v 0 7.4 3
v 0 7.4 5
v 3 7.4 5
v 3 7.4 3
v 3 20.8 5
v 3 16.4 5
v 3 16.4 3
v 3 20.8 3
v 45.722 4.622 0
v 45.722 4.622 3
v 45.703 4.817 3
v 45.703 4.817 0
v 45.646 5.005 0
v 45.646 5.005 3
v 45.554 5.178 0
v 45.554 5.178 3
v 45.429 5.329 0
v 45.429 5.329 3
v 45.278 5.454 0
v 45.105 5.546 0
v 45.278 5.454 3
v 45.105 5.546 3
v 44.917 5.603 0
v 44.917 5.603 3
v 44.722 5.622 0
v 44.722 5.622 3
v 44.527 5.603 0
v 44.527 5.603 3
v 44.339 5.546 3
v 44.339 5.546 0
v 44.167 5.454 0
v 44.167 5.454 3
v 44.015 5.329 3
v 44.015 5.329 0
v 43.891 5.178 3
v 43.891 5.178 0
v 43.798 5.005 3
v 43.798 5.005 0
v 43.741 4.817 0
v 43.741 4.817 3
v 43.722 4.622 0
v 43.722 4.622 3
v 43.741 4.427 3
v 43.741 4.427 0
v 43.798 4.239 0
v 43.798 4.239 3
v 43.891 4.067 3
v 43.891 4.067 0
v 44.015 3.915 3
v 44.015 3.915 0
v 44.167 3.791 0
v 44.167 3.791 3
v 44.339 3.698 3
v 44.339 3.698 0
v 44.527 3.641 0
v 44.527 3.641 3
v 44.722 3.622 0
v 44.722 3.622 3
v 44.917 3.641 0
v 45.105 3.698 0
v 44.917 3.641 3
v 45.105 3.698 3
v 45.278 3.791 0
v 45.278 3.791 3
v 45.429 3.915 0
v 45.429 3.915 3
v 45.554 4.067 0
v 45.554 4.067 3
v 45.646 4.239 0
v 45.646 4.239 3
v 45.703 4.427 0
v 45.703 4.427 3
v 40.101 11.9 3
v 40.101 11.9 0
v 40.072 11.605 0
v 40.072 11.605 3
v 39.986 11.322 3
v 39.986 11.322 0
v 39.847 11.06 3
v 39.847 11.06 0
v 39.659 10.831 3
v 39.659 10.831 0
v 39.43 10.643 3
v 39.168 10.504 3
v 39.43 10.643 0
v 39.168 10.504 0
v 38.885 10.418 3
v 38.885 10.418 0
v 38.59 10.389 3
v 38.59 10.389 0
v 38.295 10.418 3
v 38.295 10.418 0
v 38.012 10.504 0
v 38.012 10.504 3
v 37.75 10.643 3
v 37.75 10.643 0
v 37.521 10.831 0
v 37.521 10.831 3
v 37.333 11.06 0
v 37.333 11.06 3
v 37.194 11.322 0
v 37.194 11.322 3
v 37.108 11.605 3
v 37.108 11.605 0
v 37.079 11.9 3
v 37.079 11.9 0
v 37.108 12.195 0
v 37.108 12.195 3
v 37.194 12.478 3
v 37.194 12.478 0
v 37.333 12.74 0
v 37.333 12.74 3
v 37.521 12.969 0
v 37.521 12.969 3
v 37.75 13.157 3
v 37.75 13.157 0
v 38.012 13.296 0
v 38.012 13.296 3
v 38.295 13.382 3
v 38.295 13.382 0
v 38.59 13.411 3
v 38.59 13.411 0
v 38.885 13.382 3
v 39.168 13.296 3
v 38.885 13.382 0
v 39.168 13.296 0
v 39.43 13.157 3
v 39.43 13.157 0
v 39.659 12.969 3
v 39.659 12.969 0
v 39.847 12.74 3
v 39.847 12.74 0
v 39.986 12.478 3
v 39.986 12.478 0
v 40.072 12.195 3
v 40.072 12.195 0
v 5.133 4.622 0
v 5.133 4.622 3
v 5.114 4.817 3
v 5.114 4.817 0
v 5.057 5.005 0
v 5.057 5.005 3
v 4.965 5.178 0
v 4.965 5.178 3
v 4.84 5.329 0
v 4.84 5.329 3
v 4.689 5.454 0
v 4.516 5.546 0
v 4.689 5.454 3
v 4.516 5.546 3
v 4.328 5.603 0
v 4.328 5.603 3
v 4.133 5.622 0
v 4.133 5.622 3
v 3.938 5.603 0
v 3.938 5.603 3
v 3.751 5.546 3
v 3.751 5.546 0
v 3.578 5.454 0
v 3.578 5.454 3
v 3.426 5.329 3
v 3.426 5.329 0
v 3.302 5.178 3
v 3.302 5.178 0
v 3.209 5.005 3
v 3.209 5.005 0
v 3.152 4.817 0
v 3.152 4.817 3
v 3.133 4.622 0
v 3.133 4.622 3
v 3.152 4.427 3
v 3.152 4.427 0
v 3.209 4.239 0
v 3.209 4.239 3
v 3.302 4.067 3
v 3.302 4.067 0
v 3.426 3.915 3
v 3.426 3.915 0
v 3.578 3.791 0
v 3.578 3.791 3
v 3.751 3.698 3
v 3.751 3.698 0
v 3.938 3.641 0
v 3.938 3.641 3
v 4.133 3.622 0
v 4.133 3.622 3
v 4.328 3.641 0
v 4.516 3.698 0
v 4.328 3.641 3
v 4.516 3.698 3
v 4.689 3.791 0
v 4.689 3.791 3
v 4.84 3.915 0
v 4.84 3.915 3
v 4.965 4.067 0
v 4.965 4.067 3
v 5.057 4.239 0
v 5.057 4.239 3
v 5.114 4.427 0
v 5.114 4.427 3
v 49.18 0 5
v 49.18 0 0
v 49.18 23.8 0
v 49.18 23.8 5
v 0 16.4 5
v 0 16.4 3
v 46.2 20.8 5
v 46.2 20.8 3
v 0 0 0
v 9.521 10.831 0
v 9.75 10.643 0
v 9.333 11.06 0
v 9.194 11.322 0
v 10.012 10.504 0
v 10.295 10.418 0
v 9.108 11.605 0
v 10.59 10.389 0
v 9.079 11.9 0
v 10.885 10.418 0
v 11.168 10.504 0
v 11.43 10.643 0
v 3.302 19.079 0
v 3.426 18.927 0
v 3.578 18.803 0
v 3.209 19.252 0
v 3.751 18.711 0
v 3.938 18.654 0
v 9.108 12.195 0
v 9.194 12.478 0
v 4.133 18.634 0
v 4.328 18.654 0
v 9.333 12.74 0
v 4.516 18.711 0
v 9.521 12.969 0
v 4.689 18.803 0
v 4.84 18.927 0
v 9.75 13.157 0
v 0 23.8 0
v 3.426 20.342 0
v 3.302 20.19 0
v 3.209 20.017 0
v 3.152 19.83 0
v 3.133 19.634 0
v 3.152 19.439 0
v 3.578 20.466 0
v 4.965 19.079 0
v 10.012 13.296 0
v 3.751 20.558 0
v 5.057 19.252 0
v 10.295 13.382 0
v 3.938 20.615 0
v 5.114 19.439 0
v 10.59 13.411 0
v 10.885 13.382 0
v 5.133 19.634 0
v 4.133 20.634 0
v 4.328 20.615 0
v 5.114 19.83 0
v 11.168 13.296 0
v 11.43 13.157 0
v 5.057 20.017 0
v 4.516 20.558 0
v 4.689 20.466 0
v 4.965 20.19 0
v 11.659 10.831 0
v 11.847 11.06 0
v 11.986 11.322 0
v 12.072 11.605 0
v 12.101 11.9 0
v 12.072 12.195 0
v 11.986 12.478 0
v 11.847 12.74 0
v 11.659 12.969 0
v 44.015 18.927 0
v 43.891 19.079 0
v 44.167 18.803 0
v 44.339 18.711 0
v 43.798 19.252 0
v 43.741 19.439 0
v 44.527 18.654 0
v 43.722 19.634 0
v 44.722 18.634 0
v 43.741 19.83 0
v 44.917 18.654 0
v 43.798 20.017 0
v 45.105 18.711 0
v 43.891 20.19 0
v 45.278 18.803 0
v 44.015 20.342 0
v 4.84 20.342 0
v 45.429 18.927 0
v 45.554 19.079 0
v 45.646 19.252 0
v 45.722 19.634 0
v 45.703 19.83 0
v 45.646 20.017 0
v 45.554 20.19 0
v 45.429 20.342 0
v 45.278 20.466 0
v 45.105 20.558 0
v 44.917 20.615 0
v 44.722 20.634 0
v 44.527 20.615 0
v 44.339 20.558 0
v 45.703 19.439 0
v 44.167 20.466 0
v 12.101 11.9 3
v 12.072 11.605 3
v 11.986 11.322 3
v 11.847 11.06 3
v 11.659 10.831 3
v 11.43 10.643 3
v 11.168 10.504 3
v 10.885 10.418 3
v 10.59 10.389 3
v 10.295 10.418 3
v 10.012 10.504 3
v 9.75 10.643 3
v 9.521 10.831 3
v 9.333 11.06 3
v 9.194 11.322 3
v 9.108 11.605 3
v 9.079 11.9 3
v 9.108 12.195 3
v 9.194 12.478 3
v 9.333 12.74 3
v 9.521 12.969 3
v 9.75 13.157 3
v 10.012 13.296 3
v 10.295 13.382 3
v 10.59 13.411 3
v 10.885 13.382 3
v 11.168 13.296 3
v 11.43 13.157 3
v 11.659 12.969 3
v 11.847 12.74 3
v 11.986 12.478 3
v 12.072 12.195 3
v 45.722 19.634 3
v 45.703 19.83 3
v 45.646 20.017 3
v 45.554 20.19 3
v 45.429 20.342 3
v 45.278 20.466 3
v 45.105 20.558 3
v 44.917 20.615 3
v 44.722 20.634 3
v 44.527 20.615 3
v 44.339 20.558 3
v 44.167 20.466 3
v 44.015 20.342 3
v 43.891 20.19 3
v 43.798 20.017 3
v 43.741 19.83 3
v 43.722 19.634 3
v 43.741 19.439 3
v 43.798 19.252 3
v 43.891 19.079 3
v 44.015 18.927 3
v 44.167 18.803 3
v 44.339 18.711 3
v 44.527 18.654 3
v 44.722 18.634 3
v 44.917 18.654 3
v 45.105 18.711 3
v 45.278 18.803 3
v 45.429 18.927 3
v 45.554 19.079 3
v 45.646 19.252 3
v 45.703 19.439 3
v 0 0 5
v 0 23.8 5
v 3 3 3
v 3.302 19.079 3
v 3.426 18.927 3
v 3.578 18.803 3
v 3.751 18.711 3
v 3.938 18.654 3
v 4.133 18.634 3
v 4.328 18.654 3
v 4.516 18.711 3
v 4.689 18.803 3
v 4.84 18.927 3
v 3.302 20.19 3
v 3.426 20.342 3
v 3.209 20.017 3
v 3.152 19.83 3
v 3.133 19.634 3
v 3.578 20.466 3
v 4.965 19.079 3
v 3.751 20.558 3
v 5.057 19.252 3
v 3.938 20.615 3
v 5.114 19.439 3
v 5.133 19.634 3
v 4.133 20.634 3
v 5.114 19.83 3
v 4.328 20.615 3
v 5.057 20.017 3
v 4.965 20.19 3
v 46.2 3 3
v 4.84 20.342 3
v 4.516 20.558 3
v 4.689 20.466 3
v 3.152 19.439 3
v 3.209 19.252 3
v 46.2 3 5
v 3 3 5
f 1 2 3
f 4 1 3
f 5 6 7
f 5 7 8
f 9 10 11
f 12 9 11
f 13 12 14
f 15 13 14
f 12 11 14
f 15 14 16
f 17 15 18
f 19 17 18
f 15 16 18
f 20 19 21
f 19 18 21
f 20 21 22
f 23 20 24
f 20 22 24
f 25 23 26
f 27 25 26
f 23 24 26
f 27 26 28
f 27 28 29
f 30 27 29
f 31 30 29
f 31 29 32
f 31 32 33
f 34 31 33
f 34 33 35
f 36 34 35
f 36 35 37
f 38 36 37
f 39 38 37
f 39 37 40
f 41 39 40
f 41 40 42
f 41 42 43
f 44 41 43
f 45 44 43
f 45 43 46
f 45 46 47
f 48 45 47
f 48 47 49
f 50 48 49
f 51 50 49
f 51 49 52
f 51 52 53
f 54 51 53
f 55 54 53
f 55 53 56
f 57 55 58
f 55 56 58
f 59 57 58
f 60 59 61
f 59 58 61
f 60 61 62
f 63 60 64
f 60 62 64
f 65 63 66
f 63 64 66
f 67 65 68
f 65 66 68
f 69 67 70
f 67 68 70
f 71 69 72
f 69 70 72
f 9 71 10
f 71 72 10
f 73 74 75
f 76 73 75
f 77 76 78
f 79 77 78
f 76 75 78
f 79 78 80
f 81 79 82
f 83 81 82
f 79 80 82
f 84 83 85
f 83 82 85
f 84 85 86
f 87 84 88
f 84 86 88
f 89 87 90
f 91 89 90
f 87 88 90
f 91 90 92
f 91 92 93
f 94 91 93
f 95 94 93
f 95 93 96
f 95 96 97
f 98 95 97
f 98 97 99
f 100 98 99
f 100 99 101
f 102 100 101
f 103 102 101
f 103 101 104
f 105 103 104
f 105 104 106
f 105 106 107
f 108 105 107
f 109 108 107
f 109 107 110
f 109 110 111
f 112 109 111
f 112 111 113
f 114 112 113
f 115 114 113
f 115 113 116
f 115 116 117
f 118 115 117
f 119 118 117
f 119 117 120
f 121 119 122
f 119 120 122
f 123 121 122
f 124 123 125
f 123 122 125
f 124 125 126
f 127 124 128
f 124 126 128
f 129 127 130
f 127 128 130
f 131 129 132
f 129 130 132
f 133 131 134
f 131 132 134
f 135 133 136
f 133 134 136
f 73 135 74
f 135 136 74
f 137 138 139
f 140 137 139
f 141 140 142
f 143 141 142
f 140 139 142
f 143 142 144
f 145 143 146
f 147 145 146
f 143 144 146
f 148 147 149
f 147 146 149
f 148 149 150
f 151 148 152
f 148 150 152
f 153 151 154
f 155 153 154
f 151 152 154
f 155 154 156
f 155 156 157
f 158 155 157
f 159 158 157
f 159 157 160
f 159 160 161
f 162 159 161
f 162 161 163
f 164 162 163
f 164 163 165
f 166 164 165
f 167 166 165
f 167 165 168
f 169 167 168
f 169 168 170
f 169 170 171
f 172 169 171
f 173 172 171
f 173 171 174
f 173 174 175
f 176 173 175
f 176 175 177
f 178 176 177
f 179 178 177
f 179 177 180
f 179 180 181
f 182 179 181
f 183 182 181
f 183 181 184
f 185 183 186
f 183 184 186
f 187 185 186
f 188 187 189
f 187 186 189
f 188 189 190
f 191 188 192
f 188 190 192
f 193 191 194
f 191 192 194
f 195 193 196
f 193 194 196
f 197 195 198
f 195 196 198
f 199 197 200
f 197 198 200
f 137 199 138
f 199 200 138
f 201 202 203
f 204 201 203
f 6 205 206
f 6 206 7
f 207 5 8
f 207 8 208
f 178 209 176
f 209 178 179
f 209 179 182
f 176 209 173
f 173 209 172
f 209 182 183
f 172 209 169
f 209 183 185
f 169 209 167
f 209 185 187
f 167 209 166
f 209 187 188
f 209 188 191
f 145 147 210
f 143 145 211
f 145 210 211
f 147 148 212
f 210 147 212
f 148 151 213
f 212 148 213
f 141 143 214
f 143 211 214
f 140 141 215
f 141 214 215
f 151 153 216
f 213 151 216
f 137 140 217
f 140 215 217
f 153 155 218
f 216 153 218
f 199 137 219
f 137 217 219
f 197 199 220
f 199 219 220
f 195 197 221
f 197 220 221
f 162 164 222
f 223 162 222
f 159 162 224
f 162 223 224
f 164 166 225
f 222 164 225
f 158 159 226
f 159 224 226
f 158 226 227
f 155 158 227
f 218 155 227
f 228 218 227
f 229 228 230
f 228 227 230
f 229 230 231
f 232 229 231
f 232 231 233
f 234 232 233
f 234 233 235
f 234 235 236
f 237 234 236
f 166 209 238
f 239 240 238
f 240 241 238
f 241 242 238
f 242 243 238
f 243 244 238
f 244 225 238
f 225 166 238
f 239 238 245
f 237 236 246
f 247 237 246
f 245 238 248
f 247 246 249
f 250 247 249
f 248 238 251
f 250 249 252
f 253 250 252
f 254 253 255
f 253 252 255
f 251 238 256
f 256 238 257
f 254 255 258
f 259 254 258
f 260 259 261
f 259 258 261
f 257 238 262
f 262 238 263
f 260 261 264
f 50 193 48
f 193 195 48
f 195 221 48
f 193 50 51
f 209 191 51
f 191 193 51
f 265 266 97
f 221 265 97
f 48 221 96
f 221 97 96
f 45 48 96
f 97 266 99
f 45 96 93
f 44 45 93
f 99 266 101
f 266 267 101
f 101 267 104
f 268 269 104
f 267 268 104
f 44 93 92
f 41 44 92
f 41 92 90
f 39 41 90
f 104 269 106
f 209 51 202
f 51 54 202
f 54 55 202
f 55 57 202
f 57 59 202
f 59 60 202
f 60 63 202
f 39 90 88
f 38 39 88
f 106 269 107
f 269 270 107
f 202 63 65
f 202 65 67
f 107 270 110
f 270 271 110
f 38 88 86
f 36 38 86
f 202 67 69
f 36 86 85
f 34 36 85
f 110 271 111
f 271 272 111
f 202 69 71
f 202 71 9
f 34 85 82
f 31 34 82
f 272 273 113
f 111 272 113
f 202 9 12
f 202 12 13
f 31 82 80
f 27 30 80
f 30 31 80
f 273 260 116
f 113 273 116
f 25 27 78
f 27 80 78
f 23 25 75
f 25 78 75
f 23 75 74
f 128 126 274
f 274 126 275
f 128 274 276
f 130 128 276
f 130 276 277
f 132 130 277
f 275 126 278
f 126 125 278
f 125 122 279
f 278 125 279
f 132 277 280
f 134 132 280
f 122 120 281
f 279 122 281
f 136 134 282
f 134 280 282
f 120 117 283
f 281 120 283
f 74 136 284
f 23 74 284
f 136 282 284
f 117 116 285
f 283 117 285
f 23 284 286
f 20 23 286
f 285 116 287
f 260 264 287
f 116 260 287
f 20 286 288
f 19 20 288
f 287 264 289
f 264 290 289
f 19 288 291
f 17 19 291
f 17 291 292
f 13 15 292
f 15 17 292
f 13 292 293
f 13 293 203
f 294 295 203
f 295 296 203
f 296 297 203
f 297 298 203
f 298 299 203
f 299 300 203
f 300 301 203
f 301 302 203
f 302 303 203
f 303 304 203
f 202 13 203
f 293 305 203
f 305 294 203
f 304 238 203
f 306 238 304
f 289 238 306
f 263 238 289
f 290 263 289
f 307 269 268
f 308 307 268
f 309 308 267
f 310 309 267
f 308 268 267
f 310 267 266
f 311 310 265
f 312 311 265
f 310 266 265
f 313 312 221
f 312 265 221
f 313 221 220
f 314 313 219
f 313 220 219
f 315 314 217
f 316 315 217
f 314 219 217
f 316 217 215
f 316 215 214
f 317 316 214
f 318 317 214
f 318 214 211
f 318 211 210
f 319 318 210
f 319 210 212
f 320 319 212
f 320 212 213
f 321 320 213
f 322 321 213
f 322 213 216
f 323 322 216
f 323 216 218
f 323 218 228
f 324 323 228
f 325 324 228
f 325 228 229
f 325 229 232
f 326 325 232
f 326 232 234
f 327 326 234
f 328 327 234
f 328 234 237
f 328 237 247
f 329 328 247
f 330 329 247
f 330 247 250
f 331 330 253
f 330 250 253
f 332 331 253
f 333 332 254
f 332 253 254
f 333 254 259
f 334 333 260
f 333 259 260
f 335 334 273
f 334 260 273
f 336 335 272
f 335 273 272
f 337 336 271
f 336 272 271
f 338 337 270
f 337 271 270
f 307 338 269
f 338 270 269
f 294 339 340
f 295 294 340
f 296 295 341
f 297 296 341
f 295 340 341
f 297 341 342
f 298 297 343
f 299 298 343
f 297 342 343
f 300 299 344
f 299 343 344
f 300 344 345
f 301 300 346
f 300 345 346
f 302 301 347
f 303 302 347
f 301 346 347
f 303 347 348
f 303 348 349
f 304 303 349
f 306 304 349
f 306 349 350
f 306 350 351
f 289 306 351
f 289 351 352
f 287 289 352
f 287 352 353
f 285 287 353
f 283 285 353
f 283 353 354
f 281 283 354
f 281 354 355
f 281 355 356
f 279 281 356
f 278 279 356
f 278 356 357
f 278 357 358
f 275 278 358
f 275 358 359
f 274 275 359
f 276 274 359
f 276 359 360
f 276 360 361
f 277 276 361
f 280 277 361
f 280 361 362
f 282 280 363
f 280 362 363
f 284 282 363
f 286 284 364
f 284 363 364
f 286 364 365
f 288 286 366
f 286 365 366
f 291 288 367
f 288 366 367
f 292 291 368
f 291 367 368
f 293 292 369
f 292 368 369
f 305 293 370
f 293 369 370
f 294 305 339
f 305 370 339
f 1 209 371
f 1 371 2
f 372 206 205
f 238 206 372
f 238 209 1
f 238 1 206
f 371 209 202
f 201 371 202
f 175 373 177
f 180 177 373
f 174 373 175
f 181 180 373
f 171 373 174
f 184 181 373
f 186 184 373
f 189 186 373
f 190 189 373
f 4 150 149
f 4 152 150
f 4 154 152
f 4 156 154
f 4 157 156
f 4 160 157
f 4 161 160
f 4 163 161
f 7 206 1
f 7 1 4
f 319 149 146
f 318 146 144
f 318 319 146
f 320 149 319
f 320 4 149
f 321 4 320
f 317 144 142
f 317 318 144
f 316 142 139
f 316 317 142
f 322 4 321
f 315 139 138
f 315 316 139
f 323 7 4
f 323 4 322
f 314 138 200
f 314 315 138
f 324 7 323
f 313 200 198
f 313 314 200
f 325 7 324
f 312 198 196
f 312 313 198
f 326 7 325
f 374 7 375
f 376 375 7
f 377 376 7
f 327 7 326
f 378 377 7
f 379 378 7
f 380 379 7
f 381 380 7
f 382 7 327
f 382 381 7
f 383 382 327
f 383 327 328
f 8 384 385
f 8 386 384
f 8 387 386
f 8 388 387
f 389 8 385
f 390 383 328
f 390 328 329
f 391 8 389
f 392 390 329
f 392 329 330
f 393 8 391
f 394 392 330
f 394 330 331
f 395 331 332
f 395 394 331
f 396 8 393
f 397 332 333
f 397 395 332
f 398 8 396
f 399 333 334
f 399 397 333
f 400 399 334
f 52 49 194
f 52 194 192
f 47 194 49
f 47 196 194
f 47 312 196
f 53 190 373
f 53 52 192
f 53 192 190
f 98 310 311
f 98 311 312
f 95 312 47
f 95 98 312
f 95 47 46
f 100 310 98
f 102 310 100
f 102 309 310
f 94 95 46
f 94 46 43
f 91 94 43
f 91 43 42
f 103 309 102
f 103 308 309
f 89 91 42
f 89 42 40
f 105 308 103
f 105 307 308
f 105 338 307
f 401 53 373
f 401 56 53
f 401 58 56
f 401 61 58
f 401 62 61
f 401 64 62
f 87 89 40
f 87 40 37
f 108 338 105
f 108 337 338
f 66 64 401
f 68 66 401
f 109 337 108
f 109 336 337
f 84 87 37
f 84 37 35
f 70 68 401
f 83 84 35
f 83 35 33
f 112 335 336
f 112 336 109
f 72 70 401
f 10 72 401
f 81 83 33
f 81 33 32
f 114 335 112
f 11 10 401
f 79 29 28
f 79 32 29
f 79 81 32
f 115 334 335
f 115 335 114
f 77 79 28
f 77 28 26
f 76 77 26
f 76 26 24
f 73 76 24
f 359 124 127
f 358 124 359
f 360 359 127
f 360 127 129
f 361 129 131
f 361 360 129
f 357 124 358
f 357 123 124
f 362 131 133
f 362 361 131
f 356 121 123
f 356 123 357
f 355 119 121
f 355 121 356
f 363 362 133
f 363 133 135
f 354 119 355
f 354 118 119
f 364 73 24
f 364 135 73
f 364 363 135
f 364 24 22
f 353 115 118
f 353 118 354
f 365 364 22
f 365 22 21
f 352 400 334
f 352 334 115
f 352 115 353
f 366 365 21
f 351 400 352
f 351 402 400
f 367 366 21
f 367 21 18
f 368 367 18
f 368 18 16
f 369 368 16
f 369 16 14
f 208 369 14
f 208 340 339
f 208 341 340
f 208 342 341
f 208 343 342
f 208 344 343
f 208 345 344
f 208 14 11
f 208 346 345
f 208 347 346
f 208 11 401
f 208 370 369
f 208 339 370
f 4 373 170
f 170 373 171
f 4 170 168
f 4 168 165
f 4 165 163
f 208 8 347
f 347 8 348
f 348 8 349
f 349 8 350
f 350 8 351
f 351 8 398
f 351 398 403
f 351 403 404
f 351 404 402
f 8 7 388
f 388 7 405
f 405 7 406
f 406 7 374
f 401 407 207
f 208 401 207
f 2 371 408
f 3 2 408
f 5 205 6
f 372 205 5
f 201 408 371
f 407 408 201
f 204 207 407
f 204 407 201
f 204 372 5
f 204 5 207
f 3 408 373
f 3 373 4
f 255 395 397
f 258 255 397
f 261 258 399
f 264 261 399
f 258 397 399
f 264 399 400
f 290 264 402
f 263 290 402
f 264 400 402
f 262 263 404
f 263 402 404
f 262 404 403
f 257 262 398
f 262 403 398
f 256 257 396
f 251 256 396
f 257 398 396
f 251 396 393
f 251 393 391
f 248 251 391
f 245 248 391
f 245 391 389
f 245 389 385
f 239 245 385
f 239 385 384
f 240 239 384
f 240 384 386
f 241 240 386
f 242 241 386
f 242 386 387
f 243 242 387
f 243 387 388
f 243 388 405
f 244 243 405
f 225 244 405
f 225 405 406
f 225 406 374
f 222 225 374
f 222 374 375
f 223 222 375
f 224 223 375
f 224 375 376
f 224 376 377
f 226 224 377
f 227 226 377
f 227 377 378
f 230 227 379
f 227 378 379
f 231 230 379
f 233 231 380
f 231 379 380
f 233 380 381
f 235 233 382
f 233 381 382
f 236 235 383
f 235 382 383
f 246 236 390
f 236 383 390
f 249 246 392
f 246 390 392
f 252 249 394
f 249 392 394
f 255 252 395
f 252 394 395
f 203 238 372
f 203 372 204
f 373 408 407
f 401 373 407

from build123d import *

# Parameters (mm, degrees)
BOX_W           = 49.18
BOX_H           = 23.8
BOX_DEPTH       = 5
SKETCH_W        = 43.2
SKETCH_H        = 17.8
POCKET_DEPTH    = 2
SKETCH001_W     = 3
SKETCH001_H     = 9
POCKET001_DEPTH = 2
SKETCH004_R     = 1
POCKET005_DEPTH = 5
SKETCH005_R     = 1.51127
POCKET006_DEPTH = 5


with BuildPart() as part:
    # Box → Box (new body)
    with BuildSketch(Plane.XY):
        with Locations((24.59, 11.9)):
            Rectangle(BOX_W, BOX_H)
    extrude(amount=BOX_DEPTH)

    # Sketch → Pocket (cut)
    with BuildSketch(Plane.XY.offset(5)):
        with Locations((24.6, 11.9)):
            Rectangle(SKETCH_W, SKETCH_H)
    extrude(amount=-POCKET_DEPTH, mode=Mode.SUBTRACT)

    # Sketch001 → Pocket001 (cut)
    with BuildSketch(Plane.XY.offset(5)):
        with Locations((1.5, 11.9)):
            Rectangle(SKETCH001_W, SKETCH001_H)
    extrude(amount=-POCKET001_DEPTH, mode=Mode.SUBTRACT)

    # Sketch004 → Pocket005 (cut)
    with BuildSketch(Plane.XY.offset(3)):
        with Locations((44.722157, 19.634458)):
            Circle(SKETCH004_R)
        with Locations((44.722157, 4.622099)):
            Circle(SKETCH004_R)
        with Locations((4.133191, 19.634458)):
            Circle(SKETCH004_R)
        with Locations((4.133191, 4.622099)):
            Circle(SKETCH004_R)
    extrude(amount=-POCKET005_DEPTH, mode=Mode.SUBTRACT)

    # Sketch005 → Pocket006 (cut)
    with BuildSketch(Plane(origin=(0, 0, 0), x_dir=(1, 0, 0), z_dir=(0, 0, -1))):
        with Locations((10.59, -11.9)):
            Circle(SKETCH005_R)
        with Locations((38.59, -11.9)):
            Circle(SKETCH005_R)
    extrude(amount=-POCKET006_DEPTH, mode=Mode.SUBTRACT)


solid = part.part
